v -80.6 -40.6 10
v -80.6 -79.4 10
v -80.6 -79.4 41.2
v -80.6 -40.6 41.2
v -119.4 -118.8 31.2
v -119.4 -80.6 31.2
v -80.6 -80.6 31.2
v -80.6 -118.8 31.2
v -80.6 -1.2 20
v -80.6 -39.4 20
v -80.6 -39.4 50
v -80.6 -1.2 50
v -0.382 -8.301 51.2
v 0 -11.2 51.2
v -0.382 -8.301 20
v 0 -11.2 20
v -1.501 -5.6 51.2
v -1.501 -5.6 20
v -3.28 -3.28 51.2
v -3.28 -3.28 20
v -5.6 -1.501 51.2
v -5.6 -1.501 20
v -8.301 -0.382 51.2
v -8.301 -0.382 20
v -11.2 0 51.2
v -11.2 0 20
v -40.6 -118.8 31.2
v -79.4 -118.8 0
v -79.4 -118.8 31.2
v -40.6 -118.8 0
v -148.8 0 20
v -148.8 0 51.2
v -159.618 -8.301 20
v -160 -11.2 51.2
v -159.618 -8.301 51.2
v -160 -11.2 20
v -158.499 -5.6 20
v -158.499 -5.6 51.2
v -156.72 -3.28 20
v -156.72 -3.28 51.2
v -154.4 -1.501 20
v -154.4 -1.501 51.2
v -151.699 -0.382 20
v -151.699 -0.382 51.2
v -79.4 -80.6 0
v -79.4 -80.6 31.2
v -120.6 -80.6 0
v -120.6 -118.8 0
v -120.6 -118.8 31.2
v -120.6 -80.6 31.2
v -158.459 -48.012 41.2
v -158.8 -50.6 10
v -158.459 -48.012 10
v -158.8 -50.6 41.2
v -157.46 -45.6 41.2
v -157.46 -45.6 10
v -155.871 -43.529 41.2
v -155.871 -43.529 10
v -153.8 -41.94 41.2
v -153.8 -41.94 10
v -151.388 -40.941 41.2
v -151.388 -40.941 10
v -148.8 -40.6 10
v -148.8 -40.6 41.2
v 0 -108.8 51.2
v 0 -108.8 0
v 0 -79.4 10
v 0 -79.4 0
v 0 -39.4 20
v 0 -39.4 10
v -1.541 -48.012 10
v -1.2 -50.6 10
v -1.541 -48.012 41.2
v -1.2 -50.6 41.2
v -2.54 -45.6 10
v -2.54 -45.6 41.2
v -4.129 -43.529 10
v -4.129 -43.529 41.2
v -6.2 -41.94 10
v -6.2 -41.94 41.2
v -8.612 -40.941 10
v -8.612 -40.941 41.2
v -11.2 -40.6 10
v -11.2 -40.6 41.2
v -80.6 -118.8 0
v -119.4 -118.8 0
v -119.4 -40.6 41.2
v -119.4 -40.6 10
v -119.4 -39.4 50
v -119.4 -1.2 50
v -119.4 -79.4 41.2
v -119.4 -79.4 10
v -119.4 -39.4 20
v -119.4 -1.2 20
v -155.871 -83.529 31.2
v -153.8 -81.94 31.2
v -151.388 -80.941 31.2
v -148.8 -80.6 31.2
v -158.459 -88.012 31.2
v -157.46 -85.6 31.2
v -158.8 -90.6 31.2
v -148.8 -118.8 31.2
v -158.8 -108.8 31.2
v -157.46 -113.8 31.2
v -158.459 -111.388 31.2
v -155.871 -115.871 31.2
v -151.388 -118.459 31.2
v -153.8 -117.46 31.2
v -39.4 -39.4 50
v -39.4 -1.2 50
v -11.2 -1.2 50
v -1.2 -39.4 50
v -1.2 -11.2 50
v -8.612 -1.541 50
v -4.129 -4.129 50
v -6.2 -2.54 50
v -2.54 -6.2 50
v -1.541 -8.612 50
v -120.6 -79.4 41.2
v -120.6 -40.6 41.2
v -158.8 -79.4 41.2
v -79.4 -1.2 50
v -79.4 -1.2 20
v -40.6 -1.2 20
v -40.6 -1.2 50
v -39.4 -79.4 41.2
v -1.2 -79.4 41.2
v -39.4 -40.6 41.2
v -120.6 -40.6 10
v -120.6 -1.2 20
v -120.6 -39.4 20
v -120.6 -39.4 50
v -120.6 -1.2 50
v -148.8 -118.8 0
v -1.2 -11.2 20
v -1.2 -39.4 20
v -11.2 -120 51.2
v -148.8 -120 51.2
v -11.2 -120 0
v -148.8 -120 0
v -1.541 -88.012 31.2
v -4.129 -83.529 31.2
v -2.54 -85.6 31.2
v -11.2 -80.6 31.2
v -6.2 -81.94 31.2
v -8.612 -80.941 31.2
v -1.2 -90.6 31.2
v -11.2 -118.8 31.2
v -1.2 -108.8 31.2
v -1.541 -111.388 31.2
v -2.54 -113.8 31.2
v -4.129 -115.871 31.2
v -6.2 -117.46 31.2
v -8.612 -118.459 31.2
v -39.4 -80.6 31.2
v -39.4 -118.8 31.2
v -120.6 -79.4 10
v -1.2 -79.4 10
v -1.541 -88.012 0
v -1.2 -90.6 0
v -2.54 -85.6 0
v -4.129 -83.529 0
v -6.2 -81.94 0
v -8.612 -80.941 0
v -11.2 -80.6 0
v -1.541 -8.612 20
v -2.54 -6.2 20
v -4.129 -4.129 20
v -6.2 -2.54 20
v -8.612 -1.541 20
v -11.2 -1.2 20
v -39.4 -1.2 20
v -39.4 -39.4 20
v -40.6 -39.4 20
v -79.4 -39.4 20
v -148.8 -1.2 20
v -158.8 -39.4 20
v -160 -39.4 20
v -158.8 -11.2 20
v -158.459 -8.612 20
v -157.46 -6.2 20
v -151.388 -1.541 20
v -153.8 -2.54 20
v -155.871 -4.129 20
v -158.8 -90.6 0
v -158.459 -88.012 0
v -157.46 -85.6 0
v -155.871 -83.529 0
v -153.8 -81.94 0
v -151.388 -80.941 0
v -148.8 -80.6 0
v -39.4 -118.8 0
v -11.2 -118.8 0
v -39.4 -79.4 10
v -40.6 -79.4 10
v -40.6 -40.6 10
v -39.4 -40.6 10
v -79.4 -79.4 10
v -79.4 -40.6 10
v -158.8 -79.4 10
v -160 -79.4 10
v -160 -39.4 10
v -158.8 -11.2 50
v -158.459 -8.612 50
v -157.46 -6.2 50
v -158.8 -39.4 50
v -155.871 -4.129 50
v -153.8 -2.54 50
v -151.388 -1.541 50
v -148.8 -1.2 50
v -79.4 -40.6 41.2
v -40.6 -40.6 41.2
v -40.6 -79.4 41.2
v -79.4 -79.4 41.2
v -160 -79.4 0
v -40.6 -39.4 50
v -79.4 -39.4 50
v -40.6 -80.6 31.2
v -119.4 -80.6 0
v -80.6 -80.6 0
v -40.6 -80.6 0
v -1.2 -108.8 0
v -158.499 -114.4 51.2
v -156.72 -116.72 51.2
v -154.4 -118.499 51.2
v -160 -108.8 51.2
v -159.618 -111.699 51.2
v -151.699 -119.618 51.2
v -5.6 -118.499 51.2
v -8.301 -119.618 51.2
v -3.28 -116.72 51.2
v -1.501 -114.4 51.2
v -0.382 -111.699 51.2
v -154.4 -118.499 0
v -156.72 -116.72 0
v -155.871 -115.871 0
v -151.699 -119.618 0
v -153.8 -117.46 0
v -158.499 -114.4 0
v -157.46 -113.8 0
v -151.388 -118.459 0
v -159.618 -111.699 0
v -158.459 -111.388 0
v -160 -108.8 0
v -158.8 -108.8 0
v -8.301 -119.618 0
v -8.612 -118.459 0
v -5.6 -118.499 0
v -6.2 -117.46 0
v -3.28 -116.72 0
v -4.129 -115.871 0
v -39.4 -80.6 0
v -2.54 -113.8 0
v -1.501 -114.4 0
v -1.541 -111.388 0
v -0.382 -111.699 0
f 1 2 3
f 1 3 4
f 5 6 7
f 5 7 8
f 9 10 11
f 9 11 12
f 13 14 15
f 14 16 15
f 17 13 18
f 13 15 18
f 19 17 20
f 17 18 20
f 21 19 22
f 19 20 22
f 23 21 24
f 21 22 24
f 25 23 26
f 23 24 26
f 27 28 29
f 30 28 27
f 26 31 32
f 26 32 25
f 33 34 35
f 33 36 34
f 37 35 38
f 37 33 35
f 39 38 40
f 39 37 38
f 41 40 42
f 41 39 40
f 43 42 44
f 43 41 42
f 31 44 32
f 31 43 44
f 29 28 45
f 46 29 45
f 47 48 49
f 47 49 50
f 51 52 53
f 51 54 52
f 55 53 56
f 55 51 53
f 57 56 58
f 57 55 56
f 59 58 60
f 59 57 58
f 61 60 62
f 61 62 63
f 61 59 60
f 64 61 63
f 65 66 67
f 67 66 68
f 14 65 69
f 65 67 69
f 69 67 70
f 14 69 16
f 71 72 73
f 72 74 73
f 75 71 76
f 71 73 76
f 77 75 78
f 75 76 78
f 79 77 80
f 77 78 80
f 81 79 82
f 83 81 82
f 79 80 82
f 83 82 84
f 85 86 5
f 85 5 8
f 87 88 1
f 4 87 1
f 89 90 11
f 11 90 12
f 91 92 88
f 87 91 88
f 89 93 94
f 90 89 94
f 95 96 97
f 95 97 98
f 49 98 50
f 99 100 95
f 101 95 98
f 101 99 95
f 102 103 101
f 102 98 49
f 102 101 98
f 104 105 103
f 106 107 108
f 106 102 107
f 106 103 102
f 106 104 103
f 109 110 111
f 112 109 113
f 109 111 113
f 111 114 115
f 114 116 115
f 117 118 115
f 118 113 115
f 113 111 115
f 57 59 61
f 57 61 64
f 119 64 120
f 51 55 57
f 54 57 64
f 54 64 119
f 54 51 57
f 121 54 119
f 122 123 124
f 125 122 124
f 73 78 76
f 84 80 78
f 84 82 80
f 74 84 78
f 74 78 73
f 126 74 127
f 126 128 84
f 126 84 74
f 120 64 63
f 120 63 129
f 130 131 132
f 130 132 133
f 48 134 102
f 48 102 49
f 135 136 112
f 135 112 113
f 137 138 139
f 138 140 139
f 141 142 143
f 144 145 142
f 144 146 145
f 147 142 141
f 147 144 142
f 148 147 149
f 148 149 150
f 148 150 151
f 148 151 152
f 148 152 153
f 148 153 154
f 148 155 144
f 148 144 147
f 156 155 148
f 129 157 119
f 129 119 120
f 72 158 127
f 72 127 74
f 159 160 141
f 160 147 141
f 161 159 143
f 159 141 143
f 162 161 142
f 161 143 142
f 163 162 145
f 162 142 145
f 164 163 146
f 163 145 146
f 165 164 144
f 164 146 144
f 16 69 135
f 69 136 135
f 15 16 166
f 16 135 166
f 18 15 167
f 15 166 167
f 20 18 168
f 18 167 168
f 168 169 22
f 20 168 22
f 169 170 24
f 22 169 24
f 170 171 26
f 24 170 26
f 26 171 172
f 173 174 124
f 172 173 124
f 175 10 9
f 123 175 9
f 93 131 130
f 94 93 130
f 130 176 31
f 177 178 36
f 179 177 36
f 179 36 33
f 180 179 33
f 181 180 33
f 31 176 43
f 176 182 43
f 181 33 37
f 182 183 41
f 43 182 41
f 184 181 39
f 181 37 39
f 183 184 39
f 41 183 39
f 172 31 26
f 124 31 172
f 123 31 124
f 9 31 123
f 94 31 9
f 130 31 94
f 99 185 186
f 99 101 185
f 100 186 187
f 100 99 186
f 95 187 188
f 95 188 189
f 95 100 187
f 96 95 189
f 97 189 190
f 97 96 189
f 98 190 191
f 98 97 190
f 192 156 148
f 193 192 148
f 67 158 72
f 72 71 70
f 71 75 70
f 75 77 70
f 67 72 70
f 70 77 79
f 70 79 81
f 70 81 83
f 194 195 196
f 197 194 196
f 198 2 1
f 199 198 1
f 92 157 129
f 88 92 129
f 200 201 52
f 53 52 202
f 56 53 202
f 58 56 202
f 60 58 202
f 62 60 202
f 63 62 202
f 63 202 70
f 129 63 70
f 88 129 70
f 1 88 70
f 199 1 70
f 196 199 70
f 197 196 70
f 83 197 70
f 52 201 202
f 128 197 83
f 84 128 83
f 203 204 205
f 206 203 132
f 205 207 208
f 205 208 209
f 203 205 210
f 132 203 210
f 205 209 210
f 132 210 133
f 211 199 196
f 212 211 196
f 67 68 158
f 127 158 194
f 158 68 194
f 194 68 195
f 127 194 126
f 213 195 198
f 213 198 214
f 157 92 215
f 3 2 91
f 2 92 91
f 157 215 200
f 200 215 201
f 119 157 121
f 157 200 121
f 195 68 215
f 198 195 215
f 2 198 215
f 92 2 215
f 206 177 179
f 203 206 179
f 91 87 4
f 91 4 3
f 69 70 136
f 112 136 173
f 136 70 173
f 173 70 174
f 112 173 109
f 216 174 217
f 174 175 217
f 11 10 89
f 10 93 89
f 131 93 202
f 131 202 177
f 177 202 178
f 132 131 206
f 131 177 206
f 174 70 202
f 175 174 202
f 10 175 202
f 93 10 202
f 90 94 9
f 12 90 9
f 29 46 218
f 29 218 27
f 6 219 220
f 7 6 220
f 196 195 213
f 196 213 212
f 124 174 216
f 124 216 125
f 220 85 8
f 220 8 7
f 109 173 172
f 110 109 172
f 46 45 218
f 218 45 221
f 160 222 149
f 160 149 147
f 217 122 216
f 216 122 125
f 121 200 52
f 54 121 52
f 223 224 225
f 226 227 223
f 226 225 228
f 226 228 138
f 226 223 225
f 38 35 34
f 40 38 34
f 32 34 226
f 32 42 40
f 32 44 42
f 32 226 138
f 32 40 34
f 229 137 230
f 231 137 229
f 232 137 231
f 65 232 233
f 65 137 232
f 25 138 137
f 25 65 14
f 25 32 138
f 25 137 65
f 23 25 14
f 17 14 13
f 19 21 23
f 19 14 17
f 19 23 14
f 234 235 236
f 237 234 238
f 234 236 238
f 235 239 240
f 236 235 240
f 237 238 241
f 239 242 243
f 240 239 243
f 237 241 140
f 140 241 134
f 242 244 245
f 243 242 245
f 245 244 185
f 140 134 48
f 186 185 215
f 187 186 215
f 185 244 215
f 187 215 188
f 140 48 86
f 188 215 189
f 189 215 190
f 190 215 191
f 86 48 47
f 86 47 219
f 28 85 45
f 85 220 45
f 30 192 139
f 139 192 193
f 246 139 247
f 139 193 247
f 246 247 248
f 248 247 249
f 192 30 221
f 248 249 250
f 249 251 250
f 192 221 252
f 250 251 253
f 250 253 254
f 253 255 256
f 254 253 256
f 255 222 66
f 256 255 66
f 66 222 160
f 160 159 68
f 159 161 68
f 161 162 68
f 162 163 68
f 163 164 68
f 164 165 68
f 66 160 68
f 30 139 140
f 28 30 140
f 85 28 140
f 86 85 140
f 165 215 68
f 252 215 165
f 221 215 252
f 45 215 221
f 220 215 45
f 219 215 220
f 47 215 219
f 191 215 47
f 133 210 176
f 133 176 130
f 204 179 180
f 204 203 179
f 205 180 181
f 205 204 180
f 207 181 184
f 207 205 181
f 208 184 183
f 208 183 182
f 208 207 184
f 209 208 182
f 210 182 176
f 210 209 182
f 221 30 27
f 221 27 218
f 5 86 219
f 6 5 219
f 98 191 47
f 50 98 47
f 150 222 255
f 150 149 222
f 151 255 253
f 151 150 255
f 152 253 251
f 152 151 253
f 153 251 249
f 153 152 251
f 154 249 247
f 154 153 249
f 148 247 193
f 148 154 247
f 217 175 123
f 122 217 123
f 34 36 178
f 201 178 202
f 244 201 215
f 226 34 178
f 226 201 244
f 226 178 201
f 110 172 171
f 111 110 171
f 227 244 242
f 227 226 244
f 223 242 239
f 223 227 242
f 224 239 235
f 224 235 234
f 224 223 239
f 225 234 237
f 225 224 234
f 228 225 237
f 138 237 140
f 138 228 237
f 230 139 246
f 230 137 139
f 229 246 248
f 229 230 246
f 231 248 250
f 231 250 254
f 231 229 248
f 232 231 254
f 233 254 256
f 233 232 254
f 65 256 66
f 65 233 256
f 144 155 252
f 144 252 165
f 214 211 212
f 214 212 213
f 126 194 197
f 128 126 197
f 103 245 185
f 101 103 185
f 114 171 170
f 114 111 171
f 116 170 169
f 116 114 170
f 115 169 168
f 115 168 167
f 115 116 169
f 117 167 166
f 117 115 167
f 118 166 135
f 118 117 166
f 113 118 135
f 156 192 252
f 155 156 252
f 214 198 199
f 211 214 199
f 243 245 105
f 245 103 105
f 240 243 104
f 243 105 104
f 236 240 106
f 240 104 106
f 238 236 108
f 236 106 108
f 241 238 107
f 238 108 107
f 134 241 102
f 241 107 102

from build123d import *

# Parameters (mm, degrees)
F0_W     = 160
F0_H     = 120
F0_W_2   = 38.2
F0_H_2   = 38.2
F0_W_3   = 38.8
F0_H_3   = 38.8
F1_DEPTH = 50
F2_W     = 160
F2_H     = 120
F3_DEPTH = 1.2
F5_DEPTH = 160.001
F7_DEPTH = 158.8
F8_R     = 10
F9_R     = 11.2
F10_R    = 10


with BuildPart() as f1:
    # F0 (on Top) → F1 (new body)
    with BuildSketch(Plane.XY):
        with Locations((-80, -60)):
            Rectangle(F0_W, F0_H)
        with Locations((-139.7, -99.7)):
            Rectangle(F0_W_2, F0_H_2, mode=Mode.SUBTRACT)
        with Locations((-100, -99.7)):
            Rectangle(F0_W_3, F0_H_2, mode=Mode.SUBTRACT)
        with Locations((-60, -99.7)):
            Rectangle(F0_W_3, F0_H_2, mode=Mode.SUBTRACT)
        with Locations((-20.3, -99.7)):
            Rectangle(F0_W_2, F0_H_2, mode=Mode.SUBTRACT)
        with Locations((-139.7, -60)):
            Rectangle(F0_W_2, F0_H_3, mode=Mode.SUBTRACT)
        with Locations((-100, -60)):
            Rectangle(F0_W_3, F0_H_3, mode=Mode.SUBTRACT)
        with Locations((-139.7, -20.3)):
            Rectangle(F0_W_2, F0_H_2, mode=Mode.SUBTRACT)
        with Locations((-100, -20.3)):
            Rectangle(F0_W_3, F0_H_2, mode=Mode.SUBTRACT)
        with Locations((-60, -60)):
            Rectangle(F0_W_3, F0_H_3, mode=Mode.SUBTRACT)
        with Locations((-20.3, -60)):
            Rectangle(F0_W_2, F0_H_3, mode=Mode.SUBTRACT)
        with Locations((-60, -20.3)):
            Rectangle(F0_W_3, F0_H_2, mode=Mode.SUBTRACT)
        with Locations((-20.3, -20.3)):
            Rectangle(F0_W_2, F0_H_2, mode=Mode.SUBTRACT)
    extrude(amount=F1_DEPTH)

    # F2 (on face) → F3 (join)
    with BuildSketch(Plane.XY.offset(50)):
        with Locations((-80, -60)):
            Rectangle(F2_W, F2_H)
    extrude(amount=F3_DEPTH)

    # F4 (on face) → F5 (cut, through all)
    with BuildSketch(Plane(origin=(-160, 0, 0), x_dir=(0, -1, 0), z_dir=(-1, 0, 0))):
        Polygon((79.4, 0), (79.4, 10), (39.4, 10), (39.4, 20), (0, 20), (0, 0), align=None)
    extrude(amount=-F5_DEPTH, mode=Mode.SUBTRACT)

    # F6 (on face) → F7 (join, through all)
    with BuildSketch(Plane(origin=(-160, 0, 0), x_dir=(0, -1, 0), z_dir=(-1, 0, 0))):
        Polygon((40.6, 50), (40.6, 41.2), (79.4, 41.2), (79.4, 31.2), (118.8, 31.2), (118.8, 50), align=None)
    extrude(amount=-F7_DEPTH)

    # F8
    f8_edges = [f1.edges().sort_by_distance(p)[0] for p in [
        (-1.2, -118.8, 15.6),
        (-1.2, -1.2, 35),
        (-158.8, -118.8, 15.6),
        (-158.8, -1.2, 35),
    ]]
    fillet(f8_edges, radius=F8_R)

    # F9
    f9_edges = [f1.edges().sort_by_distance(p)[0] for p in [
        (-160, 0, 35.6),
        (0, 0, 35.6),
        (0, -120, 25.6),
        (-160, -120, 25.6),
    ]]
    fillet(f9_edges, radius=F9_R)

    # F10
    f10_edges = [f1.edges().sort_by_distance(p)[0] for p in [
        (-158.8, -80.6, 15.6),
        (-158.8, -40.6, 25.6),
        (-1.2, -40.6, 25.6),
        (-1.2, -80.6, 15.6),
    ]]
    fillet(f10_edges, radius=F10_R)


solid = f1.part
